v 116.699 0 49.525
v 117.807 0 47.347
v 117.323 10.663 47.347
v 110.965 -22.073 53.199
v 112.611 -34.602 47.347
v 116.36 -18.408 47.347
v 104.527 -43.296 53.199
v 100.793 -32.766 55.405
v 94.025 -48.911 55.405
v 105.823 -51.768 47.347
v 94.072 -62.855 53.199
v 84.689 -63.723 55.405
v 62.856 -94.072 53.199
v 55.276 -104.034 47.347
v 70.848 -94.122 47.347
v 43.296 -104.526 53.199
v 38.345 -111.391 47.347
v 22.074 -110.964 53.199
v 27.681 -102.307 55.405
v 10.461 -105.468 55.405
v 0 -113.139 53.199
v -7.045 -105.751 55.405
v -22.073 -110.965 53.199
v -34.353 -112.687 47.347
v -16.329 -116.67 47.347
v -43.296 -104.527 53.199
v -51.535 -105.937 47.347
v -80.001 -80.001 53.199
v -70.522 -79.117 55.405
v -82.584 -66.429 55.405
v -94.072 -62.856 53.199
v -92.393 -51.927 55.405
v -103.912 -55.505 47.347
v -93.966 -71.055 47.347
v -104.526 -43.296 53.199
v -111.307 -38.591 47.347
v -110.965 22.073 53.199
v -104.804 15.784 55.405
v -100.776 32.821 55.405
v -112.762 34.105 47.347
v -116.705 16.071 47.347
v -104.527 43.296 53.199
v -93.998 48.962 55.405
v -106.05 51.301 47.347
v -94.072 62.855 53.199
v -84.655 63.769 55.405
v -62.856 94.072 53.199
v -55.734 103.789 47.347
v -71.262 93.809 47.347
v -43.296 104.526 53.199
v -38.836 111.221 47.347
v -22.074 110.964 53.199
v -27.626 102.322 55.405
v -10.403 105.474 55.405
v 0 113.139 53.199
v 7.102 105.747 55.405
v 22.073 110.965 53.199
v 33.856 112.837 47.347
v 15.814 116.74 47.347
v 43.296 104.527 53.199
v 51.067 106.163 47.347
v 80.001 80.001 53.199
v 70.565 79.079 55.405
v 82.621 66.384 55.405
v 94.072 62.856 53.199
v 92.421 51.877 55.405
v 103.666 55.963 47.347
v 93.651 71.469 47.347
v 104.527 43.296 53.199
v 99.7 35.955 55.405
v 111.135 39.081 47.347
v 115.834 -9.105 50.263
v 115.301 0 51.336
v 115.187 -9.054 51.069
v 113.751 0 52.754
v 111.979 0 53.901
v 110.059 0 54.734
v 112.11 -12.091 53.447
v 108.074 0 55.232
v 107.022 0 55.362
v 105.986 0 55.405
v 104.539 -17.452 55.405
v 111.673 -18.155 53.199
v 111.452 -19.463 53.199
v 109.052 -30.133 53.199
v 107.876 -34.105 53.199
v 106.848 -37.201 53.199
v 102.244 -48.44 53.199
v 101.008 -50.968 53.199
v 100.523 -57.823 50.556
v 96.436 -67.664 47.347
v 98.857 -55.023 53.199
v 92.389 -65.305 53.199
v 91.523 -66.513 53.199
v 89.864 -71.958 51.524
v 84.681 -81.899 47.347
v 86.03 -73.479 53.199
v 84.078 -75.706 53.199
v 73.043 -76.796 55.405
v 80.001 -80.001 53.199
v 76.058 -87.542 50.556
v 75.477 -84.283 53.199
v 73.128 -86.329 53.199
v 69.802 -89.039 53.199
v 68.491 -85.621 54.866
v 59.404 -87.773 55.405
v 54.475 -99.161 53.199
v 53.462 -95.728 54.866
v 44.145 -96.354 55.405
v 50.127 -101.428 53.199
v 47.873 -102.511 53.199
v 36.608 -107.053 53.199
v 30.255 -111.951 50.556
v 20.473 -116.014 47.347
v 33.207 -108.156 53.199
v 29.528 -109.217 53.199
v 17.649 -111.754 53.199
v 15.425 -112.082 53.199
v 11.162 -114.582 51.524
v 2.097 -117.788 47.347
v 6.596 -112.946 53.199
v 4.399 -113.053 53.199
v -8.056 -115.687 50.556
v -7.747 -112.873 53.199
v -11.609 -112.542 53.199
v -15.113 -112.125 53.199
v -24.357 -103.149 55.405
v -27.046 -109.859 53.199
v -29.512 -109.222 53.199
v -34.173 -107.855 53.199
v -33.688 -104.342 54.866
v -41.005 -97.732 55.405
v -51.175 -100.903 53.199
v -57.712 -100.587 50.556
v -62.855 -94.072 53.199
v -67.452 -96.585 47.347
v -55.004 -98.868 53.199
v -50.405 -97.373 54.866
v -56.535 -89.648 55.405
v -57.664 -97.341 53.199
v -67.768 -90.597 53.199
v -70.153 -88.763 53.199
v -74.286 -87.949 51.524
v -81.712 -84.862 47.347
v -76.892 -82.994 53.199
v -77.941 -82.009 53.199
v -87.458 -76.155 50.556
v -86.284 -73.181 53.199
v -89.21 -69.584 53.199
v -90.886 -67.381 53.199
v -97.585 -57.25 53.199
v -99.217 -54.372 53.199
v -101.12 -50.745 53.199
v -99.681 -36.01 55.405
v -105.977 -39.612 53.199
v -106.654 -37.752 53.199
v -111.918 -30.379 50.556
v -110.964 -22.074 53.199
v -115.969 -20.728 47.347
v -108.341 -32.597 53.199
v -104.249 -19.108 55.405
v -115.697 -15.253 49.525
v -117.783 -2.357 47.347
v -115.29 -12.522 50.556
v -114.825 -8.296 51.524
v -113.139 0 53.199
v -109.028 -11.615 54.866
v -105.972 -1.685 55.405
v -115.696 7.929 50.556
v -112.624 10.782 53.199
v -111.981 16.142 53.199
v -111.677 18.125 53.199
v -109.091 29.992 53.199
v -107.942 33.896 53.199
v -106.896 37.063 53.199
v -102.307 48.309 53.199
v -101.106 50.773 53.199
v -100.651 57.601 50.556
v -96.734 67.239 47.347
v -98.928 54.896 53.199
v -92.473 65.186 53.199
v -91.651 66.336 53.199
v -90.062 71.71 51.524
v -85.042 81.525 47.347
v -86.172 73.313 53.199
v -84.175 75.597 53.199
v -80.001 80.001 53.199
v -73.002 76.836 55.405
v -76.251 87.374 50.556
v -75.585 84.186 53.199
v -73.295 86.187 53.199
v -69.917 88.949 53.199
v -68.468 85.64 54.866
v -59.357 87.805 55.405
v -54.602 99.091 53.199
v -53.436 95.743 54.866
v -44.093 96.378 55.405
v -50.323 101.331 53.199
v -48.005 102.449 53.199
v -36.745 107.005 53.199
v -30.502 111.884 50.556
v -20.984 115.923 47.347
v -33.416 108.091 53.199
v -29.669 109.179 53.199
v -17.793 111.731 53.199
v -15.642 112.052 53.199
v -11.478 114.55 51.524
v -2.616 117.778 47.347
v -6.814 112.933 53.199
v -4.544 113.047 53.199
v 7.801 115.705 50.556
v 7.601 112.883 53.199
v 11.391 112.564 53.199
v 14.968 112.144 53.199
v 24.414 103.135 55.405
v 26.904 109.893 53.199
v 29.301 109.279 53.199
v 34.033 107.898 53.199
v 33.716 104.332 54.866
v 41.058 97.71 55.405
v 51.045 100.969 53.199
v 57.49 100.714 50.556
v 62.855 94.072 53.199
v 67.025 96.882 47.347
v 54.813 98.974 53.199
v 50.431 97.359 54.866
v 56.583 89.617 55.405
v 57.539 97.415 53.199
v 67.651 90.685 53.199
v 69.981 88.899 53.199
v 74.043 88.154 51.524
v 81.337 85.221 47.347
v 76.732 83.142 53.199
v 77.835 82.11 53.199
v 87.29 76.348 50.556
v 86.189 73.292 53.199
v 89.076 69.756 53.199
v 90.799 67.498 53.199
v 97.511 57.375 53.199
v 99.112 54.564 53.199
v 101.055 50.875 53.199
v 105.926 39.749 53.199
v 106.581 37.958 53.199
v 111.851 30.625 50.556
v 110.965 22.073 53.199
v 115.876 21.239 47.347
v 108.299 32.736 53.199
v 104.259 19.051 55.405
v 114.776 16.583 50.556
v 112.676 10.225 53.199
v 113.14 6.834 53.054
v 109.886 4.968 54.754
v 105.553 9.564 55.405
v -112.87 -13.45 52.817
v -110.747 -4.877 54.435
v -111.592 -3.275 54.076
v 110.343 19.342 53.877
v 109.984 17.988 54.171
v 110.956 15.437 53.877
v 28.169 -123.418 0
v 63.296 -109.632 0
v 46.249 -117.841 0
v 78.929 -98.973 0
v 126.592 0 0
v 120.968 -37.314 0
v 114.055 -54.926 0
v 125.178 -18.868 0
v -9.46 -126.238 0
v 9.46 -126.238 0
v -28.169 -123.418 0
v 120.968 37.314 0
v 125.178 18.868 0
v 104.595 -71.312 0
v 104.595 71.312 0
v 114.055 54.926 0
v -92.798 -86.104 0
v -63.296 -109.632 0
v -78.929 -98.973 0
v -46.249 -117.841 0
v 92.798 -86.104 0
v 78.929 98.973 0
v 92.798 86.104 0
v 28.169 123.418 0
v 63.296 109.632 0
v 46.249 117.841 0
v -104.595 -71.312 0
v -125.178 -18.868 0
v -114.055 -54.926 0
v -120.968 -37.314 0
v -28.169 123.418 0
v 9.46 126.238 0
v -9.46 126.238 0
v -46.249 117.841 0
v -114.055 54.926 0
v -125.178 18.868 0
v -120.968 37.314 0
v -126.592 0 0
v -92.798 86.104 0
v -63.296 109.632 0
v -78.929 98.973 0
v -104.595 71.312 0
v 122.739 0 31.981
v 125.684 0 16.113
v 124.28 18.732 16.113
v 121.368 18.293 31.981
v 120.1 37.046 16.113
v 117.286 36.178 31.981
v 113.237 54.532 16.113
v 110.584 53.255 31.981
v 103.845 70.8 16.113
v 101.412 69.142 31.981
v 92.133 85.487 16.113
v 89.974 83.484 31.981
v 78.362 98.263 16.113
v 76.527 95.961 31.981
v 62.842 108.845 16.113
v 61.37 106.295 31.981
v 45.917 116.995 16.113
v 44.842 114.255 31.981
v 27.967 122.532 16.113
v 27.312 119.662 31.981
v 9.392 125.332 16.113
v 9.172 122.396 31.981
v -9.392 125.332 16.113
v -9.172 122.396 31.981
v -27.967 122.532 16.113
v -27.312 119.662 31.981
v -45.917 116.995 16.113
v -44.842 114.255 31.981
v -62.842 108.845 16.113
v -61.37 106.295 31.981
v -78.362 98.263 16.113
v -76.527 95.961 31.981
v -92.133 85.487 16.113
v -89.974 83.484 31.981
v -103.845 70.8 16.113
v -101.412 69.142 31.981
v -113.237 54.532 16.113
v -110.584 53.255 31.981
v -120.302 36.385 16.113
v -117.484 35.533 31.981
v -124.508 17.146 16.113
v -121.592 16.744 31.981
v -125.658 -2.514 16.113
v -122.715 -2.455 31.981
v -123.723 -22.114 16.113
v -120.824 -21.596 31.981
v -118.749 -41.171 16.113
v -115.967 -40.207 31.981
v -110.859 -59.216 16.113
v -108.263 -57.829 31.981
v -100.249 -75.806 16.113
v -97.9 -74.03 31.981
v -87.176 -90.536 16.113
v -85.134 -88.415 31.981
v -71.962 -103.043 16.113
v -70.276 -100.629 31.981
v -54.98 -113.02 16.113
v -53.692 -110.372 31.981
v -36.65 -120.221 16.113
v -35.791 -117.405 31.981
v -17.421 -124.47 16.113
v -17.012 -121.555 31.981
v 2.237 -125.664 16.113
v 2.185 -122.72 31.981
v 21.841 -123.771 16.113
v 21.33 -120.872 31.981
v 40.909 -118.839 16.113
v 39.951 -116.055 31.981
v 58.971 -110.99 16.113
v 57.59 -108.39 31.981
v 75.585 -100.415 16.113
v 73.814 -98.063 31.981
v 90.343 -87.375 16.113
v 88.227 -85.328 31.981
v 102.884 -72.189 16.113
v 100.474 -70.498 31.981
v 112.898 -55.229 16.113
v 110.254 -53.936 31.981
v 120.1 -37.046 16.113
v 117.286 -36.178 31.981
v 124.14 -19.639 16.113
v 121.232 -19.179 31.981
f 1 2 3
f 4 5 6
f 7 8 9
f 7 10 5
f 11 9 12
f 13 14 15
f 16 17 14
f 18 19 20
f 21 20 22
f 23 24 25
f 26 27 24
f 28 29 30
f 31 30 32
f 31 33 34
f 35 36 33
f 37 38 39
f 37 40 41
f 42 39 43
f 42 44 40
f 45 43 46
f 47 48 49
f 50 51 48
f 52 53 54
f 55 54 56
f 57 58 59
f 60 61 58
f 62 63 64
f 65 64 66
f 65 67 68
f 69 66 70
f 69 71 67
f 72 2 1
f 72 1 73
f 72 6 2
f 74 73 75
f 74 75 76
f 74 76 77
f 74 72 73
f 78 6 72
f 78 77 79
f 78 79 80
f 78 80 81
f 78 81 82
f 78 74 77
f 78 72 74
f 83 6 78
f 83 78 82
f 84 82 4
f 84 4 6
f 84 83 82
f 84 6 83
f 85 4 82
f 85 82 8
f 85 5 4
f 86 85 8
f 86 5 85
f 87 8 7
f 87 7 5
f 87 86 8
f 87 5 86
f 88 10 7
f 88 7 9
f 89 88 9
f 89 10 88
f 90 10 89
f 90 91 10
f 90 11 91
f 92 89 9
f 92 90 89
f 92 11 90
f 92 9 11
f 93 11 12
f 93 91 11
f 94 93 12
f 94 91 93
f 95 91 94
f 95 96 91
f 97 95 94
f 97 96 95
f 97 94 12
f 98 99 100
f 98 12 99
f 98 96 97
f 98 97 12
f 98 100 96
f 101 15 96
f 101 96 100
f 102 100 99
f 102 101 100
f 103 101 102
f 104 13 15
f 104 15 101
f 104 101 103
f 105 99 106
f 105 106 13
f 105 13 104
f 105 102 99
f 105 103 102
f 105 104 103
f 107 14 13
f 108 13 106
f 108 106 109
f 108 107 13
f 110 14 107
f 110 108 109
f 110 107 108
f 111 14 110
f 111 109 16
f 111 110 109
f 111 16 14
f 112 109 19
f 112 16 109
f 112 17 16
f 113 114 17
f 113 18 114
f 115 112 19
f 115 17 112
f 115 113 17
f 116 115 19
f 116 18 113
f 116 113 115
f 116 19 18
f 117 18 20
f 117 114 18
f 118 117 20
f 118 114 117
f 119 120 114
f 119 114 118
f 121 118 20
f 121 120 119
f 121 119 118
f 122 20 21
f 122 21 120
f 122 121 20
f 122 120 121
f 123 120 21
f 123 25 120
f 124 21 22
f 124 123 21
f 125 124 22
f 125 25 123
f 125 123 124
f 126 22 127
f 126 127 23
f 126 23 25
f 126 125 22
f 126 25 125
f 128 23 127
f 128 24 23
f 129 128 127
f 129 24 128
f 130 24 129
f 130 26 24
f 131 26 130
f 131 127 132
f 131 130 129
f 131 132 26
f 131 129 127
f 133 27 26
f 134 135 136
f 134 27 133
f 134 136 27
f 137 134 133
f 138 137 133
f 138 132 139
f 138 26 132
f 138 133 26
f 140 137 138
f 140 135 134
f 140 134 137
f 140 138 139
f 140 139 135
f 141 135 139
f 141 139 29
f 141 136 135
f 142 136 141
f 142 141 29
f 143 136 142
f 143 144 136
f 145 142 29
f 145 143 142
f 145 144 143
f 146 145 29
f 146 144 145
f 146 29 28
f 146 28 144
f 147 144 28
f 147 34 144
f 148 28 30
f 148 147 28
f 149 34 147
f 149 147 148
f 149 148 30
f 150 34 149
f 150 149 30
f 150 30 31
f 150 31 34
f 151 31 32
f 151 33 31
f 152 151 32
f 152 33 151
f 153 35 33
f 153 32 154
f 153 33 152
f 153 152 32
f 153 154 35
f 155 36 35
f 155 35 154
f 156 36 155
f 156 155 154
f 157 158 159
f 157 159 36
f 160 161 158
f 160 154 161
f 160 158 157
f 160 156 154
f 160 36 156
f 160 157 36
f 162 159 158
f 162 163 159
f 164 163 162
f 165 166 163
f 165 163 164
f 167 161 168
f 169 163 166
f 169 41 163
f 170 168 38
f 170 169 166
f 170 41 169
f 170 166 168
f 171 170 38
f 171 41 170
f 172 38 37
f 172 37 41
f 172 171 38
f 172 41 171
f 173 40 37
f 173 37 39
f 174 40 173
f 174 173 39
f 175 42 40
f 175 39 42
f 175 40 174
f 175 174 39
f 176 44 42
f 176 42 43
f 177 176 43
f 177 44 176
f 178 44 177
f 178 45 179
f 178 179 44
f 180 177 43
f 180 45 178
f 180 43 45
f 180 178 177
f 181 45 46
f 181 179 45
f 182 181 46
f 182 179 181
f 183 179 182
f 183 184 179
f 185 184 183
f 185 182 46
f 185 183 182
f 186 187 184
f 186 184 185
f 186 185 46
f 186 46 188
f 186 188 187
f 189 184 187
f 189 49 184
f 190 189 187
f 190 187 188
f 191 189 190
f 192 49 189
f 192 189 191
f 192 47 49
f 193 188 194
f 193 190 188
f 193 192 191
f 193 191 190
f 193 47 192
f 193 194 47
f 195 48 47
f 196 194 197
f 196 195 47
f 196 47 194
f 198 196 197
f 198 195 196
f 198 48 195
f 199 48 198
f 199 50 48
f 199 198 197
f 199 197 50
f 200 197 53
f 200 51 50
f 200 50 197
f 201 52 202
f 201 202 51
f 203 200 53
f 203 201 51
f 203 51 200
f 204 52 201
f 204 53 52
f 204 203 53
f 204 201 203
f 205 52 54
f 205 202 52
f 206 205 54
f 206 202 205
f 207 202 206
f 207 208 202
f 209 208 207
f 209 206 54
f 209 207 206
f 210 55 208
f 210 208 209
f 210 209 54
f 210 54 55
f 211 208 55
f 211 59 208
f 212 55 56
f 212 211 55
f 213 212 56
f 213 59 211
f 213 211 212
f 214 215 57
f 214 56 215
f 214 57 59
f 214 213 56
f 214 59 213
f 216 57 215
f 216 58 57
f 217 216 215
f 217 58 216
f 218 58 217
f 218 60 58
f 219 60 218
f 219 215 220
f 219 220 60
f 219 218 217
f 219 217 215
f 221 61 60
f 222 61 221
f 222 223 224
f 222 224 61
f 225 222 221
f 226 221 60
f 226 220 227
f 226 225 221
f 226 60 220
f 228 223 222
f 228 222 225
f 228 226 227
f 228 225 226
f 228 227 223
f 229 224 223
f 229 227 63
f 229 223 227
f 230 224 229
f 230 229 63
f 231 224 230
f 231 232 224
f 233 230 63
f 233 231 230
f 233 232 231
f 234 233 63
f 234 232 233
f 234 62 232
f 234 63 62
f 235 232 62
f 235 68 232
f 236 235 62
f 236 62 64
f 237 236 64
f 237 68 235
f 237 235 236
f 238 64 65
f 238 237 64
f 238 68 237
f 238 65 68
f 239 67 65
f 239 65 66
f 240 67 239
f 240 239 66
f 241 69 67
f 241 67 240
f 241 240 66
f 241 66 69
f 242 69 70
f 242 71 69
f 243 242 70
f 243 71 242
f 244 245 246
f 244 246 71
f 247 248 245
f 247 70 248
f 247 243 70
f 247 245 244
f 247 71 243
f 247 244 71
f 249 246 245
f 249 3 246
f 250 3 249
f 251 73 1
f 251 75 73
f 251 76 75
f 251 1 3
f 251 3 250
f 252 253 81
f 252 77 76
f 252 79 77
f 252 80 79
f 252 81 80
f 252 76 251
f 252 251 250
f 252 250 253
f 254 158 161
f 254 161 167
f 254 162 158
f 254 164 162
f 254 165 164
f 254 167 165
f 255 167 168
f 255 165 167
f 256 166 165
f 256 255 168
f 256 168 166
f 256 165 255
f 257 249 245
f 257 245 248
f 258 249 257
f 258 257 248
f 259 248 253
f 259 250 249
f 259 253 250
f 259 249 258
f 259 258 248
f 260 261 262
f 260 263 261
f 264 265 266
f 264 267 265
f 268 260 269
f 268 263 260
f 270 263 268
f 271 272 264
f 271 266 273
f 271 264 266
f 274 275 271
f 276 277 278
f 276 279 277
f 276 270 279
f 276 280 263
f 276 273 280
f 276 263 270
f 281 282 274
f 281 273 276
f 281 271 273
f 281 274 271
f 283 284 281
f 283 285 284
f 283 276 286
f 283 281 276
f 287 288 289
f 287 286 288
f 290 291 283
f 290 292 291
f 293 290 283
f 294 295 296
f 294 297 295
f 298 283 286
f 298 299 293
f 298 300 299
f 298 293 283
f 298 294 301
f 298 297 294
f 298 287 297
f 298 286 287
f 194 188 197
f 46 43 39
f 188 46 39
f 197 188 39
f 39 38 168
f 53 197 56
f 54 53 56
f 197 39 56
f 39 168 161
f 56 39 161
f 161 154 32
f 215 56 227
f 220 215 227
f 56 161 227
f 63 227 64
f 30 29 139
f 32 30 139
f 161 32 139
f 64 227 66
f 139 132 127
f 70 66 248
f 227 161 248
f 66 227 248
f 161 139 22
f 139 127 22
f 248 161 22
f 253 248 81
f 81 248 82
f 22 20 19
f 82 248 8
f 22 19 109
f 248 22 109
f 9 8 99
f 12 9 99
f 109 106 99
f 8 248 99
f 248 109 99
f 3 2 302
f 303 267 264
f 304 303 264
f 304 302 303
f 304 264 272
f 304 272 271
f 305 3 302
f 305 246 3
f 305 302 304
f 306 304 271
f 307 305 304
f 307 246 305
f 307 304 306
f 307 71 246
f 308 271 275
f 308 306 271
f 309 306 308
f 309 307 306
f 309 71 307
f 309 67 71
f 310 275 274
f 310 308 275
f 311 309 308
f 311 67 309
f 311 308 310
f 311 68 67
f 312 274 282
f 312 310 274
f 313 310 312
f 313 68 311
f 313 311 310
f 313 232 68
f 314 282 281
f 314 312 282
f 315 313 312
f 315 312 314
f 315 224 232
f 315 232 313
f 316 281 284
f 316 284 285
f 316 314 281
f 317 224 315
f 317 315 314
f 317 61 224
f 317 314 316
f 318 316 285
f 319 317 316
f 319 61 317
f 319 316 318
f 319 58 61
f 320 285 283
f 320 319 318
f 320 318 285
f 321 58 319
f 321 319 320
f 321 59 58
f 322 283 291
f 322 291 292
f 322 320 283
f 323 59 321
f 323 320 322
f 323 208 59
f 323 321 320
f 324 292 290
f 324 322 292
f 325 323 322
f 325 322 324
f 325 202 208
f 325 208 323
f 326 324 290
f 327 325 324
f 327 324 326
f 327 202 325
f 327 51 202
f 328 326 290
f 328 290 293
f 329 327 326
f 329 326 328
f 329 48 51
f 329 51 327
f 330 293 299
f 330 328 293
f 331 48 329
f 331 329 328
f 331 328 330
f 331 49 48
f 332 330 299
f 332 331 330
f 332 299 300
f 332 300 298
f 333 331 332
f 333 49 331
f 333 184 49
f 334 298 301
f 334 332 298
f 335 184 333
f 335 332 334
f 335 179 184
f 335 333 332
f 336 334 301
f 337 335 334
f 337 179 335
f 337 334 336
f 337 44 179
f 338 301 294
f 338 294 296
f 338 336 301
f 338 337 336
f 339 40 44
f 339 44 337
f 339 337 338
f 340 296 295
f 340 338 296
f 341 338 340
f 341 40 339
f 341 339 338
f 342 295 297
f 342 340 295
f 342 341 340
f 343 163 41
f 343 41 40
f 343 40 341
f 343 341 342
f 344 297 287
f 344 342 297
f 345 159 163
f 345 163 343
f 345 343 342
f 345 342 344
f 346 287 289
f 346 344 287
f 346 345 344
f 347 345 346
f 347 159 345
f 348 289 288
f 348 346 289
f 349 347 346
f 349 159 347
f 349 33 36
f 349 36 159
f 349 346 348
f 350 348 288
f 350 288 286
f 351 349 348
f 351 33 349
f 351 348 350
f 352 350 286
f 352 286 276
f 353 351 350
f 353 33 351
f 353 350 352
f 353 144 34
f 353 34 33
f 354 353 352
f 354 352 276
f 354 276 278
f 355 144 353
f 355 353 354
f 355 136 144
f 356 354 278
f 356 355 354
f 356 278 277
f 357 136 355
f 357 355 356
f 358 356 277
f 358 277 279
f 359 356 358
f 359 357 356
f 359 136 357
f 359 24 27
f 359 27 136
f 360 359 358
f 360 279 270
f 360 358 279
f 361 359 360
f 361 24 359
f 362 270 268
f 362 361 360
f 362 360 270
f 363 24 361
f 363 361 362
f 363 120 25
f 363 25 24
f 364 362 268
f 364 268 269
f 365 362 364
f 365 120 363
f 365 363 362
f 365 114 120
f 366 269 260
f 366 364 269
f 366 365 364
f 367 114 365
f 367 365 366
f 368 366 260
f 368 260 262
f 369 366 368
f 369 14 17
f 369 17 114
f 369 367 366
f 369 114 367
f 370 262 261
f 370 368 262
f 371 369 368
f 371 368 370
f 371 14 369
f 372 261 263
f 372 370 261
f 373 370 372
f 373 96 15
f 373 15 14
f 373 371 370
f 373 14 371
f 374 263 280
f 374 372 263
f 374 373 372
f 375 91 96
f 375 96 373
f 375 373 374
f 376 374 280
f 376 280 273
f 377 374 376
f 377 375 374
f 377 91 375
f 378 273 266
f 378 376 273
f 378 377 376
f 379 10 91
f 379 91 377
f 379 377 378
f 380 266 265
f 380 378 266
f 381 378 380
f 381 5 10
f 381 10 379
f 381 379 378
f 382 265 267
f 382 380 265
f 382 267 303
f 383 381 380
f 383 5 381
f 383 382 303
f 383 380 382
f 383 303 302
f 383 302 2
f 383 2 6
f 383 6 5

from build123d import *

# Parameters (mm, degrees)
F2_W     = 259.206295
F2_H     = 78.591727
F3_DEPTH = 142.494
F4_R     = 12.7


with BuildPart() as f1:
    # F0 (on Front) → F1 (revolve)
    with BuildSketch(Plane.XZ):
        with BuildLine():
            Line((0, 0), (126.59164, 0))
            ThreePointArc((126.59164, 0), (89.866531, 90.256872), (0, 127.927062))
            Line((0, 127.927062), (0, 0))
        make_face()
    revolve(axis=Axis((0, 0, 63.963531), (0, 0, 1)))

    # F2 (on Front) → F3 (cut, symmetric)
    with BuildSketch(Plane.XZ):
        with Locations((2.684816, 94.700593)):
            Rectangle(F2_W, F2_H)
    extrude(amount=F3_DEPTH, both=True, mode=Mode.SUBTRACT)

    # F4
    f4_edges = [f1.edges().sort_by_distance(p)[0] for p in [
        (-114.316281, 0, 55.40473),
    ]]
    fillet(f4_edges, radius=F4_R)


solid = f1.part
